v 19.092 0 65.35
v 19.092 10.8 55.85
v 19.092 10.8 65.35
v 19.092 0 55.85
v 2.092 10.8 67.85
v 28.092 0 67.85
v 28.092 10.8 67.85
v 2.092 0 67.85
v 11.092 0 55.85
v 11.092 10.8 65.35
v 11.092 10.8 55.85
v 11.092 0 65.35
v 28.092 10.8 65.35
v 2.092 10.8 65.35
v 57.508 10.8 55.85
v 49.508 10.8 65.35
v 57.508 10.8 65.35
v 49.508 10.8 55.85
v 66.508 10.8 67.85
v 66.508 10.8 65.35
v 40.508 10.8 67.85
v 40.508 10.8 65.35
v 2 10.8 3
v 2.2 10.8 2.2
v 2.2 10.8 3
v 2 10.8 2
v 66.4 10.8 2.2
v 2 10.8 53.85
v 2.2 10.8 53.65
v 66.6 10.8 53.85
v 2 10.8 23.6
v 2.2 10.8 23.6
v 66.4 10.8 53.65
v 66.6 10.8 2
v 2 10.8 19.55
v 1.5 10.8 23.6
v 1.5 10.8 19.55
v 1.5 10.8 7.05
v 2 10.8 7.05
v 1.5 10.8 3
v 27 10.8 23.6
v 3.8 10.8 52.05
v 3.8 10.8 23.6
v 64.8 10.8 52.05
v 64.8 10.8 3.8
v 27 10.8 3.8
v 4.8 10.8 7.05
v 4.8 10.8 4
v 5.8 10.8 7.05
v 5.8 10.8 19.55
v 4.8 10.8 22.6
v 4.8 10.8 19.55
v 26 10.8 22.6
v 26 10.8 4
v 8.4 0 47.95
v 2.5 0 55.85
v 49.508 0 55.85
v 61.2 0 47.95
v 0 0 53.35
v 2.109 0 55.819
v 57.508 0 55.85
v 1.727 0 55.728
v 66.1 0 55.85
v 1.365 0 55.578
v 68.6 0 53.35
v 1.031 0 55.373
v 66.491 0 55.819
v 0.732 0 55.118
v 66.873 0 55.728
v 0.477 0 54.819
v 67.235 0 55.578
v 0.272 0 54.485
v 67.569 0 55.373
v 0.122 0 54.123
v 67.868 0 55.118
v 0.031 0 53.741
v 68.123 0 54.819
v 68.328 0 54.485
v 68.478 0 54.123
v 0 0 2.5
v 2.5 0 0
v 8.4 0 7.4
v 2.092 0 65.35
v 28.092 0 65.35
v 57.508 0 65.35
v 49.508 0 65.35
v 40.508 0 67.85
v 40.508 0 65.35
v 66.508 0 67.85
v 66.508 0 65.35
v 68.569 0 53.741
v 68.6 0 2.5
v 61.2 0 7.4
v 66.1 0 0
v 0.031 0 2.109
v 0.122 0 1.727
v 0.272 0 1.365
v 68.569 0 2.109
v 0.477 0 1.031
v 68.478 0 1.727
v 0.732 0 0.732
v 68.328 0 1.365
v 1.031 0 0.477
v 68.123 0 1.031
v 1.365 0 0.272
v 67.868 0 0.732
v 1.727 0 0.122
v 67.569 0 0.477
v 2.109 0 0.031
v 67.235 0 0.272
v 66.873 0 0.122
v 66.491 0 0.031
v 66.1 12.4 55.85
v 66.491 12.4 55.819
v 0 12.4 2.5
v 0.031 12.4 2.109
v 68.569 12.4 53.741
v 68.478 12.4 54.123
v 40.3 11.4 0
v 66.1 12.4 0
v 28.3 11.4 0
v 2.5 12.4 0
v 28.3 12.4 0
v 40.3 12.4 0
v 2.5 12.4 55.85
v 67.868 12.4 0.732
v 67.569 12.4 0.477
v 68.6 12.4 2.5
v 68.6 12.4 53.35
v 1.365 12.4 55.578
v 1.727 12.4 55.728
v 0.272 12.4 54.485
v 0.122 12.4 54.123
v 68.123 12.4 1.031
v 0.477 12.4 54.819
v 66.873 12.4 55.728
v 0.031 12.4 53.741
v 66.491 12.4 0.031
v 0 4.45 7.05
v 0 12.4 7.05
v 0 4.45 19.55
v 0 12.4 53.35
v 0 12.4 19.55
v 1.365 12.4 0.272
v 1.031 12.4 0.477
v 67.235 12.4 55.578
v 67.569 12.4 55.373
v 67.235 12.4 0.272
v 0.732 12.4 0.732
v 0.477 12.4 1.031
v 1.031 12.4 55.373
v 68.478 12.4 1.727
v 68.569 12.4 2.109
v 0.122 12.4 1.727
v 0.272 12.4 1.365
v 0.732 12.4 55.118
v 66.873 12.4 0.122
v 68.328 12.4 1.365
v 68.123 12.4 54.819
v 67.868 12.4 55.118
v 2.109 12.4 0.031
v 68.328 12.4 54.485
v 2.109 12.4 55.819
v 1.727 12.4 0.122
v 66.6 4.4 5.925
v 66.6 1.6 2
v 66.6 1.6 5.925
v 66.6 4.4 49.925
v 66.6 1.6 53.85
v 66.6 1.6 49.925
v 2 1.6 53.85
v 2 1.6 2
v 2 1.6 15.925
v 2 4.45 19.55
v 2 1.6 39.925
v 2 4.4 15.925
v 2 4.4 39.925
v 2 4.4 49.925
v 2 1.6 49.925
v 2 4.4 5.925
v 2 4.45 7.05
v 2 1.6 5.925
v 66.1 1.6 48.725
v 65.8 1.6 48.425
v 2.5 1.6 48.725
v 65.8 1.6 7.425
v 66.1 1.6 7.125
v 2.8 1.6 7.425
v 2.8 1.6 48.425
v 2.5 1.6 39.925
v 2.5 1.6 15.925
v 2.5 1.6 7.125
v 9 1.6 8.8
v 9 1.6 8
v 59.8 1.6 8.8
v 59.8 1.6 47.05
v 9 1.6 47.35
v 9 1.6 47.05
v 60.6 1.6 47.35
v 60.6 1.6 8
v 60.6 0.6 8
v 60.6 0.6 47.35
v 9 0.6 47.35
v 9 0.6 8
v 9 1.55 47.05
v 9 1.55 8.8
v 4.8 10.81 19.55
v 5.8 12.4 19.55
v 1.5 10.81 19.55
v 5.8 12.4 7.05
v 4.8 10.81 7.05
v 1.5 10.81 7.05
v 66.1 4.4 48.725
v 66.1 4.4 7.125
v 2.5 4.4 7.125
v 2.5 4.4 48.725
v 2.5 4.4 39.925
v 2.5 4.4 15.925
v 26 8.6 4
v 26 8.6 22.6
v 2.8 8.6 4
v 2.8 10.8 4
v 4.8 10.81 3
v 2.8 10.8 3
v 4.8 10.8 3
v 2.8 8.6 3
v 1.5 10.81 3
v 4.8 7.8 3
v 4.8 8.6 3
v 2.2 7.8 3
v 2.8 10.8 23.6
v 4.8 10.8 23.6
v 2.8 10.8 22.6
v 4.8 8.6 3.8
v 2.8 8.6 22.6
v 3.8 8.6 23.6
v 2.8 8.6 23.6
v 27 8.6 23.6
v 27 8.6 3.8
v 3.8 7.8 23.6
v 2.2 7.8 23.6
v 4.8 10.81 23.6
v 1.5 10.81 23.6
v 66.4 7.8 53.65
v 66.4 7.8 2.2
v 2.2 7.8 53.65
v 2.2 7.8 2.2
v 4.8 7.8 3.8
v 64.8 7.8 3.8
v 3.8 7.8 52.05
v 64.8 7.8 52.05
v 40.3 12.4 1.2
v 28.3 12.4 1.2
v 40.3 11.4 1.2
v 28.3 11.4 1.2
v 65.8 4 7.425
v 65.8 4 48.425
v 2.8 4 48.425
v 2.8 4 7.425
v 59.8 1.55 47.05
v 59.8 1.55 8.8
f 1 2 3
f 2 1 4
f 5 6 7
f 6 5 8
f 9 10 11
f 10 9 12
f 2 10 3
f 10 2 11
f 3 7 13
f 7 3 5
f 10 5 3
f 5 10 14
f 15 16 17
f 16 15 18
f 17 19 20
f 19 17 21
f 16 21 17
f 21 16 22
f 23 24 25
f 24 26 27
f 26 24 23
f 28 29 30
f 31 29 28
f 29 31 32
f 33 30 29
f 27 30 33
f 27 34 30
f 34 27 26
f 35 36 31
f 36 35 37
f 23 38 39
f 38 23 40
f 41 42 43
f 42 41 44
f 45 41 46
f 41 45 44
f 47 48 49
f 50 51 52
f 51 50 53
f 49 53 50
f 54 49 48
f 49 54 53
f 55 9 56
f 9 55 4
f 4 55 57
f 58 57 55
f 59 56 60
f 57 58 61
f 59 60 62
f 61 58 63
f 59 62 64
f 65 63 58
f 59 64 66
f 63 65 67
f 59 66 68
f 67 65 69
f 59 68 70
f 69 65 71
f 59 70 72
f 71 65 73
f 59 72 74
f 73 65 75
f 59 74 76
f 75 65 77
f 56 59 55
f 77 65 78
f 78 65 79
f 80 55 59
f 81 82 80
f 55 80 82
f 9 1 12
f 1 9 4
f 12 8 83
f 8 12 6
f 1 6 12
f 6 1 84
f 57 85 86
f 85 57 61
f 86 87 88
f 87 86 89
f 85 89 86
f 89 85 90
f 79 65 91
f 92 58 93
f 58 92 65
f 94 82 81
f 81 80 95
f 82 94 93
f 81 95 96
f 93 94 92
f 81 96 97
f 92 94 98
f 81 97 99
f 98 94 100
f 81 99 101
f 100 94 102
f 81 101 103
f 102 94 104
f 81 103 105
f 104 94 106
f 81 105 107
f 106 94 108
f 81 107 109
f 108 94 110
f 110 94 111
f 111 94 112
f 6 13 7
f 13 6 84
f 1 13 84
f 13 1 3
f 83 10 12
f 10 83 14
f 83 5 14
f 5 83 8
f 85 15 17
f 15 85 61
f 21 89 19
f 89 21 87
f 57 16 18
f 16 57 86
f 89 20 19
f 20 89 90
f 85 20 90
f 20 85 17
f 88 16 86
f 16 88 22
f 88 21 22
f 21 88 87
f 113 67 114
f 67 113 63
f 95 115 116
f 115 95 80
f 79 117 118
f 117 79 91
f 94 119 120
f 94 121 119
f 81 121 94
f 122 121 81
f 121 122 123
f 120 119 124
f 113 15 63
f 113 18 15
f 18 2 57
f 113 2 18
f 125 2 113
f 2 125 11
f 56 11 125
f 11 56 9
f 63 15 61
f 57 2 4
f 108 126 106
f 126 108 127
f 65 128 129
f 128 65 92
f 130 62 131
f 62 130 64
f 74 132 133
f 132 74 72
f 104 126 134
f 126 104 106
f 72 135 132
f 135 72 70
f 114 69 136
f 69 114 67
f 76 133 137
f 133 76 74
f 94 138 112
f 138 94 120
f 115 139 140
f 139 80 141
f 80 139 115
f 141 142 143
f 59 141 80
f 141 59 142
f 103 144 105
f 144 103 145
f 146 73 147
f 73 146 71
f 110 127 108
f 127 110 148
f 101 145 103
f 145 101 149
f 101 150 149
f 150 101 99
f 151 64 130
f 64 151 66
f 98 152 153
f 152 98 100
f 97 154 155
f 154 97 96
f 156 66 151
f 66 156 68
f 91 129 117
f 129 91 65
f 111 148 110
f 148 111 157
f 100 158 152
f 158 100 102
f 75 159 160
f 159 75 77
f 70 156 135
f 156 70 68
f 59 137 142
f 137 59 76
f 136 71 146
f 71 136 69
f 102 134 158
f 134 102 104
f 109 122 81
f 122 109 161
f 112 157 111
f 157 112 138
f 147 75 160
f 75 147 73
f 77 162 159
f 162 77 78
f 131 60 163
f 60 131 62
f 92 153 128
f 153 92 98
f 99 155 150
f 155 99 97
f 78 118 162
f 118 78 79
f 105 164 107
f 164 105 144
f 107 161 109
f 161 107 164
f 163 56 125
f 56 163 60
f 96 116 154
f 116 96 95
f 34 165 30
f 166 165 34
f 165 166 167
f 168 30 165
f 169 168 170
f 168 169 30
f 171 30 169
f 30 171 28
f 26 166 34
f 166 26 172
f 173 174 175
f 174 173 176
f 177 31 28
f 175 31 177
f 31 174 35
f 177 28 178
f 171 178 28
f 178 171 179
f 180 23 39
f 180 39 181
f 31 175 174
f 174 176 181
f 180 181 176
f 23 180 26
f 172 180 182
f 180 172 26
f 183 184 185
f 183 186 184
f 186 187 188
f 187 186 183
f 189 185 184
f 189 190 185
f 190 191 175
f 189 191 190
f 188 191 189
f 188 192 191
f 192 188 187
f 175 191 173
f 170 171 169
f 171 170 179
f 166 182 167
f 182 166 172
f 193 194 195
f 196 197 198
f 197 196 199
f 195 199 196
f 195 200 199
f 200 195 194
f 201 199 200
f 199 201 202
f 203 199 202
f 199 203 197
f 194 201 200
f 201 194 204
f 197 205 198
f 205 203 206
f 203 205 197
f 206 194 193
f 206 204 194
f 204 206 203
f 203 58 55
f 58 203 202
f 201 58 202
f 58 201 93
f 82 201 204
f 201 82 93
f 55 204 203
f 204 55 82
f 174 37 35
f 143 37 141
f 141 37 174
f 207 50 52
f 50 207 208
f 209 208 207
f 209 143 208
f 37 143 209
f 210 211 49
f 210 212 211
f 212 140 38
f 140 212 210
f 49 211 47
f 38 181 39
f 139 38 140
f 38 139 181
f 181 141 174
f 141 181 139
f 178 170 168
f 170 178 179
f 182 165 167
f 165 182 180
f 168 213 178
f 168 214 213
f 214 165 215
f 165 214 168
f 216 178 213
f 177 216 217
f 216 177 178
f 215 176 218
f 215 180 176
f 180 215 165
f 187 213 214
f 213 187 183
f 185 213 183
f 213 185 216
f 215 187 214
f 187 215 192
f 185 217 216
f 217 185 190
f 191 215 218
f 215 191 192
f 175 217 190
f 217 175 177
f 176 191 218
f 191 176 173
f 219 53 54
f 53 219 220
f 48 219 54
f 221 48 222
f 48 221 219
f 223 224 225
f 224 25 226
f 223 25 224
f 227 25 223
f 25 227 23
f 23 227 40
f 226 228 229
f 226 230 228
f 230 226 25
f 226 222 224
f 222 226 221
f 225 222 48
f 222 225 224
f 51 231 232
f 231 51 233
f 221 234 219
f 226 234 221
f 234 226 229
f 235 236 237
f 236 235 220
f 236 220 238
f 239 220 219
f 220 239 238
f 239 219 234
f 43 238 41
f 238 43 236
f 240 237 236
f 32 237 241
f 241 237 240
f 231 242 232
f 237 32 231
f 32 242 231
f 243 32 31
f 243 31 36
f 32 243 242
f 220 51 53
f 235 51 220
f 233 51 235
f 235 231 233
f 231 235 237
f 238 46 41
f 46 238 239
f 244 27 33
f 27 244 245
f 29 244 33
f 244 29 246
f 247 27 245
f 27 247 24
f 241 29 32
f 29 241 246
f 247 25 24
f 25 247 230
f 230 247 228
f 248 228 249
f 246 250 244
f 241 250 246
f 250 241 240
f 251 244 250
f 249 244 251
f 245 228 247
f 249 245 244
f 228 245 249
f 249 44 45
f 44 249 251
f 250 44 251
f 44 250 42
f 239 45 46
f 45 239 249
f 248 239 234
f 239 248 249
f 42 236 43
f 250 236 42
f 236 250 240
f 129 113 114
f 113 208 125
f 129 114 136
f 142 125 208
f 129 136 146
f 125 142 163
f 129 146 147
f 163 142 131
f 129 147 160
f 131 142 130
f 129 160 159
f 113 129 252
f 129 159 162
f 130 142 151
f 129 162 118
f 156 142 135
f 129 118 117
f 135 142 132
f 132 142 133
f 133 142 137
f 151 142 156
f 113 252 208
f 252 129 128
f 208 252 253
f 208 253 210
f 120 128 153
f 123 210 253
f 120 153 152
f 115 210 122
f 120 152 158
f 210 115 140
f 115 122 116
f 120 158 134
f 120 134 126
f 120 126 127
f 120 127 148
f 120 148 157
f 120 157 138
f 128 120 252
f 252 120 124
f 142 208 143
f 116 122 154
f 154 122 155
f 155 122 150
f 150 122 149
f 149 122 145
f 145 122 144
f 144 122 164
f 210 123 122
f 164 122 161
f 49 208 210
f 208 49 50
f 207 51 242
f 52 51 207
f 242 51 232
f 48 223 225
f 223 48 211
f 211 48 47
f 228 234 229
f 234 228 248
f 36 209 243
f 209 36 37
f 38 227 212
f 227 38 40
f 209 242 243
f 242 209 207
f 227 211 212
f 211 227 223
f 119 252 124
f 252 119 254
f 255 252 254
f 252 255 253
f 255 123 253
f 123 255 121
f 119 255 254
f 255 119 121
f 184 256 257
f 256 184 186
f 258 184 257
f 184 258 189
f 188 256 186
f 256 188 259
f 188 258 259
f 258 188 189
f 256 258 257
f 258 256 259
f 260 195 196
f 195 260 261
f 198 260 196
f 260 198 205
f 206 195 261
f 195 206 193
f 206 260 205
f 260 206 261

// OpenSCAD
// 航班牌外壳 —— 2.4 寸 ST7789 屏(横放) + ESP32-C3, 像站牌一样挂在显示器下沿
//
// 两个零件, 都不用支撑:
//   part = "shell" 前壳(正面朝下打印): 正面边框 + 四周侧壁 + 顶上两根挂柱
//   part = "lid"   后盖(平放打印): 带一圈卡边, 塞进前壳后面
//   part = "both"  装好的样子(只看效果)
// 命令行导出: openscad -D 'part="shell"' -o shell.stl flightboard_case.scad
//
// 坐标: X 左右(宽), Y 前后(0 = 正面, 往后为正), Z 上下(0 = 底面)。单位 mm。
// ★ 标星的是我没量过、按 2.4 寸 240x320 屏的常见尺寸估的, 打印前请用卡尺核对。

part = "both";

// ---------- 屏幕 ----------
// 实测: 外框 63 x 41, 左右各 5 mm 非显示边, 点亮时显示区外一圈 1 mm 黑边
panel_w = 63;       // 屏幕外框宽(横放时左右)
panel_h = 41;       // 屏幕外框高
panel_t = 2.4;      // ★ 屏幕厚(玻璃 + 背光), 只影响定位框高度
aa_w    = 51;       // 显示区宽: 63 - 2x5 - 2x1
aa_h    = 38.25;    // 显示区高: 按 320x240 的 4:3 算
border_fpc = 6;     // 左右一样宽: 5 mm 边 + 1 mm 黑边
fpc_side = "left";  // 从正面看排线在哪边: "left" / "right"
fpc_gap  = 24;      // 定位框在排线那一侧留的缺口宽(让排线弯到背后)
trim_left = 1.0;    // 开口左边再往里收(从正面看)
trim_top  = 0.5;    // 开口上边再往里收
black_margin = 0.8;// 开口比显示区每边大多少; 实际黑边只有 1 mm, 开口压住 0.2 mm, 不露银边

// ---------- 外形 ----------
frame   = 8;        // 正面开口四周的边框宽
wall    = 2.0;      // 侧壁厚
front_t = 1.6;      // 正面板厚
inner_depth = 9.2;  // 正面板后面的内部深度(整体厚度比上一版减 1/3: 18.6 -> 12.4)
corner_r = 2.5;     // 外壳四角圆角
fit     = 0.3;      // 屏幕和定位框之间的间隙

// ---------- 后盖 ----------
lid_t   = 1.6;      // 后盖板厚
lip_h   = 3.0;      // 卡边伸进去的深度
lip_t   = 1.6;      // 卡边厚
lid_fit = 0.2;      // 卡边和侧壁之间的间隙(太松就改小, 太紧改大)

// ---------- ESP32 (贴在后盖内侧) 和 USB-C 开孔 ----------
// ESP32-C3 Super Mini 平贴在后盖里面, USB-C 朝左; 后盖上有一圈定位槽。USB-C 开孔的位置由板子位置算出来。
esp_l   = 22.6;     // 板长(USB-C 那头到另一头)
esp_w   = 18.0;     // 板宽
esp_pcb = 1.0;      // 板厚
usbc_t  = 3.2;      // USB-C 插座高(板子上面那部分)
esp_z0  = 4;        // 板子下边离外壳底面多高(内壁往上一点)
esp_gap = 0.3;      // 定位槽比板子大一圈
usb_open_w = 12.5;  // 开孔宽(上下方向): 线头塑料外壳大约 12 mm
usb_open_h = 7.5;   // 开孔高(前后方向): 线头外壳大约 6.5 mm
usb_side = "left";

// ---------- 挂柱(顶上两根, 粘在显示器下沿) ----------
post_w   = 8;       // 柱子宽
post_h   = 12;      // 柱子高(外壳顶面到粘贴面)
pad_w    = 26;      // 粘贴面宽
pad_t    = 2.5;     // 粘贴面厚
post_pos = [0.22, 0.78];  // 两根柱子在宽度上的位置(比例)
// 柱子和粘贴面前后贯穿整个外壳深度: 正面朝下打印时不悬空, 粘贴面也够大(约 26 x 20)

// ================= 以下由上面的参数算出 =================
win_w = aa_w + 2 * black_margin;
win_h = aa_h + 2 * black_margin;
border_other = (panel_w - aa_w - border_fpc);       // 另一侧的边
border_tb = (panel_h - aa_h) / 2;
// 开口外每边的距离: 至少 frame, 也要保证屏幕外框之外还有间隙 + 侧壁
need = function(b) b - black_margin + fit + wall;
fl = max(frame, need(fpc_side == "left" ? border_fpc : border_other));
fr = max(frame, need(fpc_side == "left" ? border_other : border_fpc));
fb = max(frame, need(border_tb));
ft = fb;
outer_w = fl + win_w + fr;
outer_h = fb + win_h + ft;
depth   = front_t + inner_depth;
usb_cy  = depth - esp_pcb - usbc_t / 2;           // USB-C 中心离正面多远: 后盖内表面往前 板厚 + 半个插座
usb_cz  = esp_z0 + esp_gap + esp_w / 2;           // USB-C 中心离底面多高: 板子的正中
// 屏幕外框在正面坐标里的位置
panel_x0 = fl + black_margin - (fpc_side == "left" ? border_fpc : border_other);
panel_z0 = fb + black_margin - border_tb;

echo(str("外壳正面 ", outer_w, " x ", outer_h, " mm, 深 ", depth + lid_t, " mm (含后盖); 开口 ",
         win_w, " x ", win_h, "; 左右边框 ", fl, " / ", fr, ", 上下 ", fb));

module rounded_box(w, d, h, r) {
  // 四角(从正面看)圆角的长方体, 前后方向是直的
  hull() for (x = [r, w - r], z = [r, h - r]) translate([x, 0, z]) rotate([-90, 0, 0]) cylinder(r = r, h = d, $fn = 40);
}

module usb_hole(extra = 0) {
  // 侧壁上的开孔; 贴着后缘, 所以是个开口朝后的缺口。extra: 往里多挖多少(后盖的卡边要让开)
  x = usb_side == "left" ? -1 : outer_w - wall - 1 - extra;
  translate([x, usb_cy - usb_open_h / 2, usb_cz - usb_open_w / 2]) cube([wall + 2 + extra, usb_open_h + 5, usb_open_w]);
}

module shell() {
  difference() {
    union() {
      rounded_box(outer_w, depth, outer_h, corner_r);
      // 挂柱 + 粘贴面
      for (p = post_pos) {
        cx = outer_w * p;
        translate([cx - post_w / 2, 0, outer_h - 1]) cube([post_w, depth, post_h + 1]);
        translate([cx - pad_w / 2, 0, outer_h + post_h - pad_t]) cube([pad_w, depth, pad_t]);
      }
    }
    // 内腔
    translate([wall, front_t, wall]) cube([outer_w - 2 * wall, depth, outer_h - 2 * wall]);
    // 正面开口, 前沿倒一个小角; 左边和上边按实装效果再往里收一点(屏幕位置不动)
    ow = win_w - trim_left; oh = win_h - trim_top;
    translate([fl + trim_left, -1, fb]) cube([ow, front_t + 2, oh]);
    translate([fl + trim_left, -0.01, fb]) hull() {
      translate([-0.6, 0, -0.6]) cube([ow + 1.2, 0.01, oh + 1.2]);
      translate([0, 0.6, 0]) cube([ow, 0.01, oh]);
    }
    usb_hole();
  }
  // 屏幕定位框: 贴着正面板背面, 把屏幕框在开口后面; 排线那一侧留缺口
  rib = 1.2;
  difference() {
    translate([panel_x0 - fit - rib, front_t, panel_z0 - fit - rib])
      cube([panel_w + 2 * (fit + rib), panel_t + 0.4, panel_h + 2 * (fit + rib)]);
    translate([panel_x0 - fit, front_t - 1, panel_z0 - fit]) cube([panel_w + 2 * fit, panel_t + 2, panel_h + 2 * fit]);
    gx = fpc_side == "left" ? panel_x0 - fit - rib - 1 : panel_x0 + panel_w + fit - 1;
    translate([gx, front_t - 1, panel_z0 + panel_h / 2 - fpc_gap / 2]) cube([rib + 2, panel_t + 2, fpc_gap]);
  }
}

module esp_guide() {
  // 后盖内侧的定位槽: 上、下、远端三面挡边, USB-C 那头敞开; 挡边比板子高一点
  rib = 1.0; rh = esp_pcb + 1.2;
  x0 = usb_side == "left" ? wall + 0.8 : outer_w - wall - 0.8 - esp_l - 2 * esp_gap;
  L = esp_l + 2 * esp_gap; Wd = esp_w + 2 * esp_gap;
  translate([0, depth - rh, 0]) {
    translate([x0, 0, esp_z0 - rib]) cube([L, rh, rib]);                 // 下
    translate([x0, 0, esp_z0 + Wd]) cube([L, rh, rib]);                  // 上
    xe = usb_side == "left" ? x0 + L : x0 - rib;
    translate([xe, 0, esp_z0 - rib]) cube([rib, rh, Wd + 2 * rib]);      // 远端
  }
}

module lid() {
  esp_guide();
  // 后盖: 外板 + 伸进内腔的一圈卡边(在装好的位置画)
  difference() {
    union() {
      translate([0, depth, 0]) rounded_box(outer_w, lid_t, outer_h, corner_r);
      iw = outer_w - 2 * wall - 2 * lid_fit;
      ih = outer_h - 2 * wall - 2 * lid_fit;
      translate([wall + lid_fit, depth - lip_h, wall + lid_fit]) difference() {
        cube([iw, lip_h, ih]);
        translate([lip_t, -1, lip_t]) cube([iw - 2 * lip_t, lip_h + 2, ih - 2 * lip_t]);
      }
    }
    usb_hole(lid_fit + lip_t + 1);
    // 卡边在板子那一段整段让开, 板子的 USB 头才能顶到侧壁
    ex = usb_side == "left" ? wall - 0.5 : outer_w - wall - lid_fit - lip_t - 1;
    translate([ex, depth - lip_h - 1, esp_z0 - 1]) cube([lid_fit + lip_t + 1.5, lip_h + 1.01, esp_w + 2 * esp_gap + 2]);
    // 底边一个撬口, 指甲伸进去就能把后盖拔出来
    translate([outer_w / 2 - 6, depth + lid_t - 1, -1]) cube([12, 2, 2.2]);
  }
}

if (part == "shell") rotate([90, 0, 0]) shell();                                   // 正面朝下
else if (part == "lid") translate([0, 0, depth + lid_t]) rotate([-90, 0, 0]) lid(); // 外表面朝下
else {
  color("#2b2f36") shell();
  color("#3a3f48") lid();
  // 示意: 屏幕(黑框) + 显示区(亮)
  ax = panel_x0 + (fpc_side == "left" ? border_fpc : border_other);
  color("#050505") translate([panel_x0, front_t, panel_z0]) cube([panel_w, panel_t, panel_h]);
  color("#1d4f8f") translate([ax, front_t - 0.05, panel_z0 + border_tb]) cube([aa_w, 0.1, aa_h]);
}
